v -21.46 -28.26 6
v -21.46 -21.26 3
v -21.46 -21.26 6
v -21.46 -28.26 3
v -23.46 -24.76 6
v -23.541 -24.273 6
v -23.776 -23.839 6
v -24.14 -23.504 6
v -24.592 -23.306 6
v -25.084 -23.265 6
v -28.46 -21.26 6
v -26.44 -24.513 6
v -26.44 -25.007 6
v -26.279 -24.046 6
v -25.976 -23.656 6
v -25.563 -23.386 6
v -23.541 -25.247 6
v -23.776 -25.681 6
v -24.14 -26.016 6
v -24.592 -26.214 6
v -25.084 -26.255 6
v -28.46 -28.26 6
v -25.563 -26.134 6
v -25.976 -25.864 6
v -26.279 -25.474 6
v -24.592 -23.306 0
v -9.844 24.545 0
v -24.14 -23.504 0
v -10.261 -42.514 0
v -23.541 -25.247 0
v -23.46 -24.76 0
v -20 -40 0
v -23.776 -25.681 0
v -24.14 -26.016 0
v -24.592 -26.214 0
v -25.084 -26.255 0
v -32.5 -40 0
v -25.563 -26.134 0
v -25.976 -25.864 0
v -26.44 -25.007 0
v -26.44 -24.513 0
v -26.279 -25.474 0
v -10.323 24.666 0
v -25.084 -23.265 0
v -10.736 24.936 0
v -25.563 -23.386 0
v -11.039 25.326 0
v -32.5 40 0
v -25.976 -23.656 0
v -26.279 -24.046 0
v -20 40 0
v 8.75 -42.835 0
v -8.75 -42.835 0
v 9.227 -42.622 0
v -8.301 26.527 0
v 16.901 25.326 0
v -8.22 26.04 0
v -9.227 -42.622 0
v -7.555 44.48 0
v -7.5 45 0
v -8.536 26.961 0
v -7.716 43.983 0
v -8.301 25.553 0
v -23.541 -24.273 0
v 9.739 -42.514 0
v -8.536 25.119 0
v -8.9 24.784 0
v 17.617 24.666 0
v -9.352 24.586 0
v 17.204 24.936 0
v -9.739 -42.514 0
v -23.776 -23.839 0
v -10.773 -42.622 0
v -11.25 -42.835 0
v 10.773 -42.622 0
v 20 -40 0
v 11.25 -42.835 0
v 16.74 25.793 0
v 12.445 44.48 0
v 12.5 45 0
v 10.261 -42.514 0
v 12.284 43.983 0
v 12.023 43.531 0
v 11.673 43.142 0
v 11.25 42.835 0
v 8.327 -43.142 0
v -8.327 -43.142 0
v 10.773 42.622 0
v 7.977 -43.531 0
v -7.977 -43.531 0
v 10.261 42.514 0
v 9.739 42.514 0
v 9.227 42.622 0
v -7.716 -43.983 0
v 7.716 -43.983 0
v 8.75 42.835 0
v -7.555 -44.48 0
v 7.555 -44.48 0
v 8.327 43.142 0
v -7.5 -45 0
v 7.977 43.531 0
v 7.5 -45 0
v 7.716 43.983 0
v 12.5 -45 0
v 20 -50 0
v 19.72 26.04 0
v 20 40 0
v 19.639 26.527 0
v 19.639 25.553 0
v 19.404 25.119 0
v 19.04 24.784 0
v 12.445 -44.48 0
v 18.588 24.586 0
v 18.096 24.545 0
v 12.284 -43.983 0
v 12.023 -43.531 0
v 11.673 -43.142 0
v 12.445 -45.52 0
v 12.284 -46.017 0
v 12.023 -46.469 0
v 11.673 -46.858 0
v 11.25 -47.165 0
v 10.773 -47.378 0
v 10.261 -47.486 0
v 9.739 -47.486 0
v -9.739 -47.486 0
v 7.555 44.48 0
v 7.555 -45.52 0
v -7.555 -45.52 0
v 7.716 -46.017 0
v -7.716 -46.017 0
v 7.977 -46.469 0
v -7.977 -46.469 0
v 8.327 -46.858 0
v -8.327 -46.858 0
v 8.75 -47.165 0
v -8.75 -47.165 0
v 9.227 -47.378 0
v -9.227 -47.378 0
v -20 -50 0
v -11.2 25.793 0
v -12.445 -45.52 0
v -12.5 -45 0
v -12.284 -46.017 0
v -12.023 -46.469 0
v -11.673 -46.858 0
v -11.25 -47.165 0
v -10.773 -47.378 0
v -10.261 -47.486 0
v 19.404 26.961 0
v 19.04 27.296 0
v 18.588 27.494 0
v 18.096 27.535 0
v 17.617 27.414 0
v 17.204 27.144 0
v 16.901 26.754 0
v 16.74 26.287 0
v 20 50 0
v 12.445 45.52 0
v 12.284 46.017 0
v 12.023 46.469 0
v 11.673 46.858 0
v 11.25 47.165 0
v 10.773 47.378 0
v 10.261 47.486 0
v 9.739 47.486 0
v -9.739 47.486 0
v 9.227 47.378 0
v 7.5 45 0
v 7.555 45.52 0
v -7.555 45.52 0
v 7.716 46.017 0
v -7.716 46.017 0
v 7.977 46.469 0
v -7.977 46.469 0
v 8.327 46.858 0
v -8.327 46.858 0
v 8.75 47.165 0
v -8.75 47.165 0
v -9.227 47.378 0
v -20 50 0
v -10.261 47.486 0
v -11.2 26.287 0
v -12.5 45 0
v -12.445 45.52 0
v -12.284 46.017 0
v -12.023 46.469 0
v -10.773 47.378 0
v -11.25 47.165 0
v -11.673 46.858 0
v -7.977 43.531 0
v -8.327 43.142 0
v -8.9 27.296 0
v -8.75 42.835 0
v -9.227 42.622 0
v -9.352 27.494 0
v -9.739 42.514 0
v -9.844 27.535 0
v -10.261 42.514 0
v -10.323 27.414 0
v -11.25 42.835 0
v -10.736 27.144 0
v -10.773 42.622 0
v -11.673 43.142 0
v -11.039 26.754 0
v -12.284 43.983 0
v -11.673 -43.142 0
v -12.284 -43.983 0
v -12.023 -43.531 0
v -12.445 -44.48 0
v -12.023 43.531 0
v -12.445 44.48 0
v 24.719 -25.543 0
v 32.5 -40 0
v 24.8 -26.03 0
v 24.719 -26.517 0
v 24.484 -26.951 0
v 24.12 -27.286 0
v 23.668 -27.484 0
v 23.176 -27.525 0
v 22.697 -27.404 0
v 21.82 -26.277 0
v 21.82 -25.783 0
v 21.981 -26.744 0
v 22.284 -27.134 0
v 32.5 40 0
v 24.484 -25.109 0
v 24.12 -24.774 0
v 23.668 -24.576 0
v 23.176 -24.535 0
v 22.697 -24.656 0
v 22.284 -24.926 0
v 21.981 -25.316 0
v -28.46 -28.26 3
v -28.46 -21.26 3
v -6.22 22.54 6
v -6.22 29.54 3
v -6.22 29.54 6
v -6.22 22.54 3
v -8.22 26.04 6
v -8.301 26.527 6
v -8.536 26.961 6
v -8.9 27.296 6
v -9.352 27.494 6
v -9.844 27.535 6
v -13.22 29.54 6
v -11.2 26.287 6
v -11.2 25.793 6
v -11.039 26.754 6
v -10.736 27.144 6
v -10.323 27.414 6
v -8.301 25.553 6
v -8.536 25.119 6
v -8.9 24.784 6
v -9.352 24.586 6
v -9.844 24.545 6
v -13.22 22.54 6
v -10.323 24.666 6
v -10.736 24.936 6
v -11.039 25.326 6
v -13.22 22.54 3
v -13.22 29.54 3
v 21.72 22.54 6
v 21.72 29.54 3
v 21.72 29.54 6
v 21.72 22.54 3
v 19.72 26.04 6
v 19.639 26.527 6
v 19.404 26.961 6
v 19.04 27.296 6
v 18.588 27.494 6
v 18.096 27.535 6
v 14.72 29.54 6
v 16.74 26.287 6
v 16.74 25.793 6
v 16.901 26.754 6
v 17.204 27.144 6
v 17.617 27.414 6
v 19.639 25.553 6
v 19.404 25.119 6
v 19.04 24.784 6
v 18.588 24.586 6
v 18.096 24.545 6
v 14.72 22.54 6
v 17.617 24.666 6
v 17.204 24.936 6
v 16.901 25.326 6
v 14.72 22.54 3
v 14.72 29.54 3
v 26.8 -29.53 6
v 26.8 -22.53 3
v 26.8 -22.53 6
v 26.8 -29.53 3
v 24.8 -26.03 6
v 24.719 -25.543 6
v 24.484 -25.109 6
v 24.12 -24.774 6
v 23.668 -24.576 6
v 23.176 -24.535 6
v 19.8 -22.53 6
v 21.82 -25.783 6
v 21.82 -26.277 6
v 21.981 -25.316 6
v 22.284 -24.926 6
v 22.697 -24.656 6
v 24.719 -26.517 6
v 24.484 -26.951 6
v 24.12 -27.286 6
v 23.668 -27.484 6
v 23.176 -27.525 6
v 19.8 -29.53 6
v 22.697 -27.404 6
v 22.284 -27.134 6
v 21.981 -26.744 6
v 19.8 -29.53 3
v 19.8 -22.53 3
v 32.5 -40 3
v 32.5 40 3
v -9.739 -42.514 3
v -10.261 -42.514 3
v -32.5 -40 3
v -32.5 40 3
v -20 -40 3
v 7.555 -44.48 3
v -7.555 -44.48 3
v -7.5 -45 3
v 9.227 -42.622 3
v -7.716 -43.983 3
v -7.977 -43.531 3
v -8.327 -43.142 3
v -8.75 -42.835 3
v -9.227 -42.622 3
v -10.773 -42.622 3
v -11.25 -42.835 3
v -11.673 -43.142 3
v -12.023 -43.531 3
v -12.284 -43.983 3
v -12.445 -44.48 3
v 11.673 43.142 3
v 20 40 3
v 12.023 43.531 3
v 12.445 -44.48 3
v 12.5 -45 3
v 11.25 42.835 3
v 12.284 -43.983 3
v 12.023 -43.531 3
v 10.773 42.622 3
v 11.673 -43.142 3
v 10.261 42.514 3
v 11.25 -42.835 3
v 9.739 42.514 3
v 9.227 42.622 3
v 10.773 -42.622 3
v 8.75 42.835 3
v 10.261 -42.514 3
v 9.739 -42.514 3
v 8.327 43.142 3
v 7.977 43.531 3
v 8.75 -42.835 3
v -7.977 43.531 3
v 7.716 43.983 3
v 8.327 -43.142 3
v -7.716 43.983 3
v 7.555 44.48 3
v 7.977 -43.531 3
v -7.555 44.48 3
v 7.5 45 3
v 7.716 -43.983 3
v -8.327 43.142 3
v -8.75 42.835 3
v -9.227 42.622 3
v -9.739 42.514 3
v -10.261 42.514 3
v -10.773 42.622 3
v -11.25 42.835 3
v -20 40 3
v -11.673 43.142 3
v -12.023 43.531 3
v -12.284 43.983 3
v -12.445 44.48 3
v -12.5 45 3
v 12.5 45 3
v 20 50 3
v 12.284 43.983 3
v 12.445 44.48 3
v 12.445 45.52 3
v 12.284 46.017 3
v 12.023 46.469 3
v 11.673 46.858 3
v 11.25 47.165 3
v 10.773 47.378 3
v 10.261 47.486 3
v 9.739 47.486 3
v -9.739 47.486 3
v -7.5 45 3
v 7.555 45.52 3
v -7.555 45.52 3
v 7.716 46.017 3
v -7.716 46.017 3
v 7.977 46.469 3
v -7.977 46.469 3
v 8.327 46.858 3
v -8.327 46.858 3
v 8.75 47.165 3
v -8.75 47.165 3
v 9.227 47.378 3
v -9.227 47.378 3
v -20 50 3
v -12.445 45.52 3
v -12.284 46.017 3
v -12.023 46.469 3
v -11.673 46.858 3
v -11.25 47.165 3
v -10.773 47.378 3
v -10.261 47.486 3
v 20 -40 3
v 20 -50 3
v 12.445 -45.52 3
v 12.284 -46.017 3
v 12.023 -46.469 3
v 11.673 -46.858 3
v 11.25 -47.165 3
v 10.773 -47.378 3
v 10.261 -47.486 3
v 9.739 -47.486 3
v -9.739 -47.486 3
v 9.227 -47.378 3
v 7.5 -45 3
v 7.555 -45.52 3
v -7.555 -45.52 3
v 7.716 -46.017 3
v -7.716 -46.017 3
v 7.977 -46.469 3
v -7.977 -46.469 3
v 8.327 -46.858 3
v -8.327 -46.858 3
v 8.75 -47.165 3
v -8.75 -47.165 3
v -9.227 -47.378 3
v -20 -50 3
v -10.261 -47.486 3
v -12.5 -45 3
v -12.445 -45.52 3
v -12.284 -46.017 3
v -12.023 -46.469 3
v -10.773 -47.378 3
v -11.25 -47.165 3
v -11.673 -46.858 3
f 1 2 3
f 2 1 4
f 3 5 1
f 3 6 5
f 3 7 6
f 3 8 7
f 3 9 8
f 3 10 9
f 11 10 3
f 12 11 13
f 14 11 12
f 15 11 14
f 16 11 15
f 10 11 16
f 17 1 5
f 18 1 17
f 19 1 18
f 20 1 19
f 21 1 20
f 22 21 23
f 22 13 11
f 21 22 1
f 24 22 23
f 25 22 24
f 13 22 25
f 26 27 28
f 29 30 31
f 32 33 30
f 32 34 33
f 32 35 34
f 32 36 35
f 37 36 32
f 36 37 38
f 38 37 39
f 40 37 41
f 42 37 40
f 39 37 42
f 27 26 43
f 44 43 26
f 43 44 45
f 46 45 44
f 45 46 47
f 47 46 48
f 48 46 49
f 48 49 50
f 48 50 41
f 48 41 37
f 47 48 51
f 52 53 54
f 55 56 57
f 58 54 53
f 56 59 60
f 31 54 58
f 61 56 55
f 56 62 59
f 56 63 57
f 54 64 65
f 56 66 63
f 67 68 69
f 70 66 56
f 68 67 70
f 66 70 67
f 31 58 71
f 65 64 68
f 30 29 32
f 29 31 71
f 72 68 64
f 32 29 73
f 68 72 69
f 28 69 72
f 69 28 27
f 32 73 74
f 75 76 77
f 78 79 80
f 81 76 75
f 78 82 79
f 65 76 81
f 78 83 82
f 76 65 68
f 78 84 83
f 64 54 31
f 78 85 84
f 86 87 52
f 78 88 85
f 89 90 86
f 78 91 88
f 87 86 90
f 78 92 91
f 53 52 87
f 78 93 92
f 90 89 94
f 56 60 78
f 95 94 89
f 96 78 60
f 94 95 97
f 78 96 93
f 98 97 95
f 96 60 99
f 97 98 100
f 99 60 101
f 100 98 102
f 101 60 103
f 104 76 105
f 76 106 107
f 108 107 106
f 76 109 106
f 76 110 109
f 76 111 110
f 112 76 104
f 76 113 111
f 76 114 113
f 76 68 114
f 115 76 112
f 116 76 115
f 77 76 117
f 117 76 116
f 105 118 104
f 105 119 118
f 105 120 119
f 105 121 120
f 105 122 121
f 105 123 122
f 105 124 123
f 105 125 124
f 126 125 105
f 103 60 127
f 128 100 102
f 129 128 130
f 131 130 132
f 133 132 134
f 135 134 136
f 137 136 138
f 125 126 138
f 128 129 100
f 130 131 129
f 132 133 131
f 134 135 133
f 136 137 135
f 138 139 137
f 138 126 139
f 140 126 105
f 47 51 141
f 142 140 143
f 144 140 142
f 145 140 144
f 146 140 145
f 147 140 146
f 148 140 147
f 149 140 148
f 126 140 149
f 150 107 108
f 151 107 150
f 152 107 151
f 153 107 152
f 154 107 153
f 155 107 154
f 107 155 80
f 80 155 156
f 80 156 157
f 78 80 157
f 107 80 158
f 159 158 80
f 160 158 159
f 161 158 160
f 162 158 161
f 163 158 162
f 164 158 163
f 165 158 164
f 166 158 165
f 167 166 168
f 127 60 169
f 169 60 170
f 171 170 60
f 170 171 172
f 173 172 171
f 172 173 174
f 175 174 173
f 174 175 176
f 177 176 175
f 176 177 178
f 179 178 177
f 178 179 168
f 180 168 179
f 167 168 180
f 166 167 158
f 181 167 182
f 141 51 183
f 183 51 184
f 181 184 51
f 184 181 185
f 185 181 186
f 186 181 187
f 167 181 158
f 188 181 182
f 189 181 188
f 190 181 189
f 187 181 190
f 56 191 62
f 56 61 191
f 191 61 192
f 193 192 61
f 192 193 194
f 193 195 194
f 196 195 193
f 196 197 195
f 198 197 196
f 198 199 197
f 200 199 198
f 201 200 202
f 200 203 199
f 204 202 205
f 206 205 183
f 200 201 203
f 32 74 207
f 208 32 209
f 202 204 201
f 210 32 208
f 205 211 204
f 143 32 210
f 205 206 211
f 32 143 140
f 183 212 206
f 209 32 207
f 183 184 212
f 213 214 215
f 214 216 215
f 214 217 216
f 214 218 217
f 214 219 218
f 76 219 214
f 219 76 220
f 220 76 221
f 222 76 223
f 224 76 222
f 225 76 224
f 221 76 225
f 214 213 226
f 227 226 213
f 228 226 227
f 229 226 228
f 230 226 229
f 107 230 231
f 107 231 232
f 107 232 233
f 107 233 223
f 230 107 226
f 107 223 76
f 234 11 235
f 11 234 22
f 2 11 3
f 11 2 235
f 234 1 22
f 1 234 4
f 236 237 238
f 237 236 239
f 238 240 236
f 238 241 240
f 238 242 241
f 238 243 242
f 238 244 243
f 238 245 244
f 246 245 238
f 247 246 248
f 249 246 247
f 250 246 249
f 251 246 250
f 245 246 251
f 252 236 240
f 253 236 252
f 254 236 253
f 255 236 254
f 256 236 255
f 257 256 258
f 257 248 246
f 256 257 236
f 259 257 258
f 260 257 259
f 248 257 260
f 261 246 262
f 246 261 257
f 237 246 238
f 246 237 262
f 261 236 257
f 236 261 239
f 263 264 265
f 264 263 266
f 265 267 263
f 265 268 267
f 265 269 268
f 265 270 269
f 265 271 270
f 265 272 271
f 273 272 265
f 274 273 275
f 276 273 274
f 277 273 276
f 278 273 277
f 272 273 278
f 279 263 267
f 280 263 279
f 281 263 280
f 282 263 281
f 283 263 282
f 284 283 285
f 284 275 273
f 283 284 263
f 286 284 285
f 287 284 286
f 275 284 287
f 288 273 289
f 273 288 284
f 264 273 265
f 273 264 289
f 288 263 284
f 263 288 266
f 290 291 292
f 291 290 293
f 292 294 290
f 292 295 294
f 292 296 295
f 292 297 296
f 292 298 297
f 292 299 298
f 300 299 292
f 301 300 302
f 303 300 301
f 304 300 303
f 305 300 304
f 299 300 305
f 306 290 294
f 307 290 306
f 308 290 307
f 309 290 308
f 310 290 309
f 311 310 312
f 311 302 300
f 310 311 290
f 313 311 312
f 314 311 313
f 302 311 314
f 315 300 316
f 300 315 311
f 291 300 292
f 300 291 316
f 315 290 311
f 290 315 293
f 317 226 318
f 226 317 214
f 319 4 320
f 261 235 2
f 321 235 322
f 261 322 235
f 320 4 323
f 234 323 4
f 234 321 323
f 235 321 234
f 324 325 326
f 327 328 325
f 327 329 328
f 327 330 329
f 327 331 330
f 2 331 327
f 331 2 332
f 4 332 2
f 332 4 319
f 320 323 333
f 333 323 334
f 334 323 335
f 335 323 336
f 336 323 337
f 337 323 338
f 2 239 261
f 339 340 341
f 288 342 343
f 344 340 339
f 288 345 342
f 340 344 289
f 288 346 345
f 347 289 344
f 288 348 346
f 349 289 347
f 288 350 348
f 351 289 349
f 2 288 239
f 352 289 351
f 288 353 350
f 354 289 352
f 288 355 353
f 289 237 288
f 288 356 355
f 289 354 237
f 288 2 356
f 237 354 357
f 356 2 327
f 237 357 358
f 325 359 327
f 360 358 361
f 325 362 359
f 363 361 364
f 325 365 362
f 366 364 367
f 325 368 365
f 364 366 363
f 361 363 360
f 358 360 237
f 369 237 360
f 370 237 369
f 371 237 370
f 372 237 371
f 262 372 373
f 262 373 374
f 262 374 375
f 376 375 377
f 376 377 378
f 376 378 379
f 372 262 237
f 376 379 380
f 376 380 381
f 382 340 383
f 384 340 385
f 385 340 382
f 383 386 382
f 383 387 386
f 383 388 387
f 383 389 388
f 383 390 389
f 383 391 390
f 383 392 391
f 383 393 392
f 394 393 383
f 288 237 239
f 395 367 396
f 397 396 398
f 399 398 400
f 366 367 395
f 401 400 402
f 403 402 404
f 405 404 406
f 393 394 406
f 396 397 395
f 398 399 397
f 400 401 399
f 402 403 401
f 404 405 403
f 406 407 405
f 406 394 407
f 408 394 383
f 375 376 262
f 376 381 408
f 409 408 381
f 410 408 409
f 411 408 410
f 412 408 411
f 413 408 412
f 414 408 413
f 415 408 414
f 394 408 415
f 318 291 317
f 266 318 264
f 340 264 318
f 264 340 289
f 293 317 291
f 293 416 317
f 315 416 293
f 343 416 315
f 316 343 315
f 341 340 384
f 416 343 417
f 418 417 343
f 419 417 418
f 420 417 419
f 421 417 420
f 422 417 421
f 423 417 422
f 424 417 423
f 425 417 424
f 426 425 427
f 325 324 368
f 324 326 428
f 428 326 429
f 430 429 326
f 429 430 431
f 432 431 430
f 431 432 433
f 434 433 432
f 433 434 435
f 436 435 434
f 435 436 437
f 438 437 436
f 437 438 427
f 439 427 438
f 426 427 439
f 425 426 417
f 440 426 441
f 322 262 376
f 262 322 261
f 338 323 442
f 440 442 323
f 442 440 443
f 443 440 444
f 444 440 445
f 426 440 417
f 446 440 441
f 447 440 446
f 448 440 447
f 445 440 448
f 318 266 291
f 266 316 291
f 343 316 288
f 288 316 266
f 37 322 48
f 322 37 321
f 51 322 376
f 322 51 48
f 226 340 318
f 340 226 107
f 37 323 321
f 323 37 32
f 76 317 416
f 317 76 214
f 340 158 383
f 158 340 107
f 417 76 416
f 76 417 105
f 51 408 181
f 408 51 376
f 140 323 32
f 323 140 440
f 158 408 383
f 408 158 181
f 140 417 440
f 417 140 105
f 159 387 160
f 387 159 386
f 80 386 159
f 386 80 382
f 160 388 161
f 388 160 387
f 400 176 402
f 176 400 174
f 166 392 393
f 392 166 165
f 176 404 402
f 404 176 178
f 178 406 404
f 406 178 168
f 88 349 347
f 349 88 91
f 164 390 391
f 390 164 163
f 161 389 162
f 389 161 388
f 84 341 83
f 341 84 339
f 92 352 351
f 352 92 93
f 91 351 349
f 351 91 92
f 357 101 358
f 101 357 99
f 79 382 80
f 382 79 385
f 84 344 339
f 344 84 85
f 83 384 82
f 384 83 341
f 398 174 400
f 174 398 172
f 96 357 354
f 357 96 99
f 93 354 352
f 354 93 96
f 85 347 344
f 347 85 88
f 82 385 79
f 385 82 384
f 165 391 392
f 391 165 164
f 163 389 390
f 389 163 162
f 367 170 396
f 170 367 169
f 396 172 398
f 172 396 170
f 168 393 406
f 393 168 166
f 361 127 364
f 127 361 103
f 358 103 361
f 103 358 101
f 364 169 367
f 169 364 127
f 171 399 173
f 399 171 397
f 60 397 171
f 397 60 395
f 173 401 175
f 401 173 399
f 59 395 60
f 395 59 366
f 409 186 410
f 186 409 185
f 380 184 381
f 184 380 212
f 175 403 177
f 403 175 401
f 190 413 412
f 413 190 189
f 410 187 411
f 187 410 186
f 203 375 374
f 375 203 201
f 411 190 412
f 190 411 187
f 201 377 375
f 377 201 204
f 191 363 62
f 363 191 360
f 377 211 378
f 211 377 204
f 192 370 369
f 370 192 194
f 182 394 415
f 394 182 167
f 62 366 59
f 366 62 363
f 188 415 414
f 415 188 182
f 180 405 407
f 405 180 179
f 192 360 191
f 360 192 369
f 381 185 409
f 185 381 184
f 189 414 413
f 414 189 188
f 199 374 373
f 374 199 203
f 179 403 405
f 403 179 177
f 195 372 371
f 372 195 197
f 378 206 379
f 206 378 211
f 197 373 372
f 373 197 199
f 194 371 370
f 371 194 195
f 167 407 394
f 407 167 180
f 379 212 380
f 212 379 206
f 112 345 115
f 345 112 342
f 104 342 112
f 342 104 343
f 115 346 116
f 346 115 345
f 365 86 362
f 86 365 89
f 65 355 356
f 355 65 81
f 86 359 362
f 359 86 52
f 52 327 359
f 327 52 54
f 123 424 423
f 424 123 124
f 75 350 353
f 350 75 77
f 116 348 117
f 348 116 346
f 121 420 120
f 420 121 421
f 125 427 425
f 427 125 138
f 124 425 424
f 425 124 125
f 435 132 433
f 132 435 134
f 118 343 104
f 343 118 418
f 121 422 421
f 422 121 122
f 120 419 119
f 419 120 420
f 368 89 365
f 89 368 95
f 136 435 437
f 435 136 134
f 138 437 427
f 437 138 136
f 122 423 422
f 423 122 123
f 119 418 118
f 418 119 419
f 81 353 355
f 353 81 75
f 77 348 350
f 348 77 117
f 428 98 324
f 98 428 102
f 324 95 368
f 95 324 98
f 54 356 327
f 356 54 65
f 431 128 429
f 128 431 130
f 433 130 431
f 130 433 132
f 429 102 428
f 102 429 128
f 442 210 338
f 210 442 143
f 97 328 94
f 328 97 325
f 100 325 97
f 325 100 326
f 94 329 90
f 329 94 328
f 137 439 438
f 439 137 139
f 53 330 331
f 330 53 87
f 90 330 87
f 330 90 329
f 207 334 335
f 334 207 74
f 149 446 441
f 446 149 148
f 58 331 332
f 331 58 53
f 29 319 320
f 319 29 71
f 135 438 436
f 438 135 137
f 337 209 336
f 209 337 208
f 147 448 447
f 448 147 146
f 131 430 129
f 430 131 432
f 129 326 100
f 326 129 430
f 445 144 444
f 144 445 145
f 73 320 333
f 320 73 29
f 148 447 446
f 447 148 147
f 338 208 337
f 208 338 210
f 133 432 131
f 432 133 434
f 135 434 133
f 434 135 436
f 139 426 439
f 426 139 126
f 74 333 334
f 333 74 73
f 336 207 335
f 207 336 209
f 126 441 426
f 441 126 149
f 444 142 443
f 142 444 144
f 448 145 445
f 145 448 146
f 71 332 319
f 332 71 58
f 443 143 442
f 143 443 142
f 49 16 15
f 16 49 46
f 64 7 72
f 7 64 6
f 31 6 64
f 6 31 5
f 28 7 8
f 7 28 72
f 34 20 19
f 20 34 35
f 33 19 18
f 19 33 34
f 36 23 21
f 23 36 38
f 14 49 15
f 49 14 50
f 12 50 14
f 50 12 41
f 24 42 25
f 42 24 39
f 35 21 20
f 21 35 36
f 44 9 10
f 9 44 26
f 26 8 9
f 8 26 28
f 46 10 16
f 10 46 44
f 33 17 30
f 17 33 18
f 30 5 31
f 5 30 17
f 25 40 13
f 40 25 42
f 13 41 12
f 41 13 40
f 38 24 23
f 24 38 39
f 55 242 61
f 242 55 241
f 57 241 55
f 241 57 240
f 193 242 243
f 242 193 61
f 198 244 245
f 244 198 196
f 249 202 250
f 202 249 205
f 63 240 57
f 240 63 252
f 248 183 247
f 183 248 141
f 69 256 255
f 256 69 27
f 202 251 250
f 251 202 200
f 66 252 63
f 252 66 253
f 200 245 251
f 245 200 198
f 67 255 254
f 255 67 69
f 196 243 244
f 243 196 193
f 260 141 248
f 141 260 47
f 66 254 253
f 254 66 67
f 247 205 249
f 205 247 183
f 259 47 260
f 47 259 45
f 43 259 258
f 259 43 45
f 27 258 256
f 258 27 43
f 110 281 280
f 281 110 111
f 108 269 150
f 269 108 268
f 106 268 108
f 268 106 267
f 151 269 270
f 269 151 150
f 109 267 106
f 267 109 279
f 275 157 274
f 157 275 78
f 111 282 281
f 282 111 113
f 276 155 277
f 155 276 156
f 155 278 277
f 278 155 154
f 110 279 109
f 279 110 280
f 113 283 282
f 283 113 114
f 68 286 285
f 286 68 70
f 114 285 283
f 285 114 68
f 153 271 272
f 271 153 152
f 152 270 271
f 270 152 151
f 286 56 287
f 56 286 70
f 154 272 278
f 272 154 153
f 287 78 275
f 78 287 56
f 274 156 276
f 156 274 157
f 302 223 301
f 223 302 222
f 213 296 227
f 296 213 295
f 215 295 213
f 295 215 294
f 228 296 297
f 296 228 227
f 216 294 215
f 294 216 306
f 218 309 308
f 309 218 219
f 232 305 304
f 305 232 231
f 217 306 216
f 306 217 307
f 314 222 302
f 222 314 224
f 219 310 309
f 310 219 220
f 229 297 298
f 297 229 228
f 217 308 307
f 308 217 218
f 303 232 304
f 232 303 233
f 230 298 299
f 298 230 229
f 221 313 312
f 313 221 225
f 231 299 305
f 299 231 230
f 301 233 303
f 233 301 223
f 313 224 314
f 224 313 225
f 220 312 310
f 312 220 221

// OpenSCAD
$fs = 0.5;

module hole(s) cylinder(h=10,d=s, center=true);
module m5hole() { hole(5); };
module m3hole() { hole(3); };
scubeSize = 7;
module scube() { cube([scubeSize,scubeSize,6], center = true); };

module dscube() { difference() { scube(); m3hole(); }}


x = 65;
y = 80;

/*
standardCoordinates = [[-x/2+scubeSize/2,-y/2+scubeSize/2,+1.5],
                      [x/2-scubeSize/2,-y/2+scubeSize/2,+1.5],
                      [x/2-scubeSize/2,y/2-scubeSize/2,+1.5],
                      [-x/2+scubeSize/2,y/2-scubeSize/2,+1.5]
                     ];
*/
yunOffX = -x/2+5;
yunOffY = -y/2;
yunHoles = [
  [  2.54+yunOffX, 15.24+yunOffY, 1.5 ],
  [  17.78+yunOffX, 66.04+yunOffY,  1.5 ],
  [  45.72+yunOffX, 66.04+yunOffY, 1.5 ],
  [  50.8+yunOffX, 13.97+yunOffY, 1.5 ]
  ];

// in Pi2B holes form a rectangle of 58x49
piOffX = -x/2+7.5;
piOffY = -y/2+10;
pi2modelBholes = [ [0+piOffX,0+piOffY,1.5], 
                   [49+piOffX,0+piOffY,1.5], 
                   [0+piOffX,58+piOffY,1.5], 
                   [49+piOffX,58+piOffY,1.5] 
];


supportCoordinates = yunHoles;

vslotHoles = [[10,45,0],[-10,45,0],[10,-45,0],[-10,-45,0]];


module base(scale) { difference()  {union() {cube([x,y,3], center = true); 
                                             cube([40,100,3], center = true);
                                             for (i = supportCoordinates) {                                                
                                                 translate(i) scube();  } 
                                   }; 
                                    for (i = vslotHoles)
                                    {
                                        translate(i) m5hole();
                                    }
                                    for ( i = supportCoordinates) {
                                        translate(i) m3hole();
                                    }
                                    }; }
translate([0,0,1.5]) base(1);
